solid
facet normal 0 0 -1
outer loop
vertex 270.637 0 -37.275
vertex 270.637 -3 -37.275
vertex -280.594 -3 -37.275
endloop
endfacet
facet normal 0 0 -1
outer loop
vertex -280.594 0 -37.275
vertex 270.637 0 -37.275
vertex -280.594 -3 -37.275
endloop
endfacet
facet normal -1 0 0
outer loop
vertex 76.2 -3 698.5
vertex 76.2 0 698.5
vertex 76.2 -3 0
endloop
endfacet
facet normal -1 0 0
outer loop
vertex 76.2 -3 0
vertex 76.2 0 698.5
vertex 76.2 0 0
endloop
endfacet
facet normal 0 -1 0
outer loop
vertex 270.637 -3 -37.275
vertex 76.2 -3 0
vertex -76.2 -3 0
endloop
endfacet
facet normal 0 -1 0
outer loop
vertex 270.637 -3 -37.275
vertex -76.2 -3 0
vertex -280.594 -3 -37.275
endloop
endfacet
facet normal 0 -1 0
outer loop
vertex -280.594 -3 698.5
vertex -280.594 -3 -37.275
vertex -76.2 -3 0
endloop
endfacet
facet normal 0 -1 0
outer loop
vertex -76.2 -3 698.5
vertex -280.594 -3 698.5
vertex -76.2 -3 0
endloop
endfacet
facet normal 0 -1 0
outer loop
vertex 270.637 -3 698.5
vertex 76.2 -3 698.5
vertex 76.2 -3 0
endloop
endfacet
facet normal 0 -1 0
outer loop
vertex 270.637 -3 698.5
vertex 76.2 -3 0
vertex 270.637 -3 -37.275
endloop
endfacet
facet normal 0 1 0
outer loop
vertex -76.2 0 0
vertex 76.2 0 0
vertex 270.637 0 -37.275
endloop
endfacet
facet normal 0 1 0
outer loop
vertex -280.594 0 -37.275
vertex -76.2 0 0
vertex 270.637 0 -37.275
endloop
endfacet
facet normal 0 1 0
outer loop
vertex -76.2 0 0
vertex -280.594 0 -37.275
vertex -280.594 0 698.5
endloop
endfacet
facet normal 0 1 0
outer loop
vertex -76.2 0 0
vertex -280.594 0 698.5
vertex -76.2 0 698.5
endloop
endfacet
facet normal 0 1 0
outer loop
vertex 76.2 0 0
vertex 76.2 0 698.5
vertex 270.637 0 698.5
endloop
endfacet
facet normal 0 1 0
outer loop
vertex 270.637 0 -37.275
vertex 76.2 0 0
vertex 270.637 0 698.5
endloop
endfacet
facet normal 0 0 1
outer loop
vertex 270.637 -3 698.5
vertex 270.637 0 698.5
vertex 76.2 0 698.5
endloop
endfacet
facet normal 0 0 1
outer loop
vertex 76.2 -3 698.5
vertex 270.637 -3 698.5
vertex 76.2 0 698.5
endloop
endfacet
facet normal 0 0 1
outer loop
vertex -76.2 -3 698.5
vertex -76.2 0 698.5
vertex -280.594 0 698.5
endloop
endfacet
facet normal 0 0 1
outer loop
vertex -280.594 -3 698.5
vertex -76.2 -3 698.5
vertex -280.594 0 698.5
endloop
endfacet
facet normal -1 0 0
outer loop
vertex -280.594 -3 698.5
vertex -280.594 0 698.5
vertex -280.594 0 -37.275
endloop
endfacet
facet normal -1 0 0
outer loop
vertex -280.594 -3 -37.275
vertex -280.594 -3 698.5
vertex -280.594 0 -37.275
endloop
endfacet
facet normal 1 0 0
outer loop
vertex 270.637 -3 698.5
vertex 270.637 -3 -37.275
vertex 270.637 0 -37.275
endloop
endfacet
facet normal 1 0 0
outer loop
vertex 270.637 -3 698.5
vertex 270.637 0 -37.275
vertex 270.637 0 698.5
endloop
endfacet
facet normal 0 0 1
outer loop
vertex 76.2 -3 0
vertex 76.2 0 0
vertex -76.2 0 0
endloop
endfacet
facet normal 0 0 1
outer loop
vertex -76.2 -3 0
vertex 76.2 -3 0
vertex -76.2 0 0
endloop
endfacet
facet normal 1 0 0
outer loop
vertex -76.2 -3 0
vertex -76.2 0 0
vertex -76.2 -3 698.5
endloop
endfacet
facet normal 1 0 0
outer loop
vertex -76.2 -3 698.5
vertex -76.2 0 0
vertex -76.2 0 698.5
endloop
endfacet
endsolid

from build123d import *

# Parameters (mm, degrees)
F1_DEPTH = 3
F3_DEPTH = 25.4
F4_W     = 9.96188
F4_H     = 735.775
F5_DEPTH = 25.4


with BuildPart() as f1:
    # F0 (on Front) → F1 (new body)
    with BuildSketch(Plane.XZ):
        Polygon((-76.2, 698.5), (-280.5938, 698.5), (-280.5938, -41.275), (280.59888, -41.275), (280.59888, 698.5), (76.2, 698.5), (76.2, 0), (0, 0), (-76.2, 0), align=None)
    extrude(amount=F1_DEPTH)

    # F2 (on face) → F3 (cut)
    with BuildSketch(Plane.XZ.offset(3)):
        Polygon((-280.5938, -37.275), (-280.5938, -41.275), (-280.2390158176, -41.275), (280.59888, -41.275), (280.59888, -37.275), align=None)
    extrude(amount=-F3_DEPTH, mode=Mode.SUBTRACT)

    # F4 (on face) → F5 (cut)
    with BuildSketch(Plane.XZ.offset(3)):
        with Locations((275.61794, 330.6125)):
            Rectangle(F4_W, F4_H)
    extrude(amount=-F5_DEPTH, mode=Mode.SUBTRACT)


solid = f1.part
